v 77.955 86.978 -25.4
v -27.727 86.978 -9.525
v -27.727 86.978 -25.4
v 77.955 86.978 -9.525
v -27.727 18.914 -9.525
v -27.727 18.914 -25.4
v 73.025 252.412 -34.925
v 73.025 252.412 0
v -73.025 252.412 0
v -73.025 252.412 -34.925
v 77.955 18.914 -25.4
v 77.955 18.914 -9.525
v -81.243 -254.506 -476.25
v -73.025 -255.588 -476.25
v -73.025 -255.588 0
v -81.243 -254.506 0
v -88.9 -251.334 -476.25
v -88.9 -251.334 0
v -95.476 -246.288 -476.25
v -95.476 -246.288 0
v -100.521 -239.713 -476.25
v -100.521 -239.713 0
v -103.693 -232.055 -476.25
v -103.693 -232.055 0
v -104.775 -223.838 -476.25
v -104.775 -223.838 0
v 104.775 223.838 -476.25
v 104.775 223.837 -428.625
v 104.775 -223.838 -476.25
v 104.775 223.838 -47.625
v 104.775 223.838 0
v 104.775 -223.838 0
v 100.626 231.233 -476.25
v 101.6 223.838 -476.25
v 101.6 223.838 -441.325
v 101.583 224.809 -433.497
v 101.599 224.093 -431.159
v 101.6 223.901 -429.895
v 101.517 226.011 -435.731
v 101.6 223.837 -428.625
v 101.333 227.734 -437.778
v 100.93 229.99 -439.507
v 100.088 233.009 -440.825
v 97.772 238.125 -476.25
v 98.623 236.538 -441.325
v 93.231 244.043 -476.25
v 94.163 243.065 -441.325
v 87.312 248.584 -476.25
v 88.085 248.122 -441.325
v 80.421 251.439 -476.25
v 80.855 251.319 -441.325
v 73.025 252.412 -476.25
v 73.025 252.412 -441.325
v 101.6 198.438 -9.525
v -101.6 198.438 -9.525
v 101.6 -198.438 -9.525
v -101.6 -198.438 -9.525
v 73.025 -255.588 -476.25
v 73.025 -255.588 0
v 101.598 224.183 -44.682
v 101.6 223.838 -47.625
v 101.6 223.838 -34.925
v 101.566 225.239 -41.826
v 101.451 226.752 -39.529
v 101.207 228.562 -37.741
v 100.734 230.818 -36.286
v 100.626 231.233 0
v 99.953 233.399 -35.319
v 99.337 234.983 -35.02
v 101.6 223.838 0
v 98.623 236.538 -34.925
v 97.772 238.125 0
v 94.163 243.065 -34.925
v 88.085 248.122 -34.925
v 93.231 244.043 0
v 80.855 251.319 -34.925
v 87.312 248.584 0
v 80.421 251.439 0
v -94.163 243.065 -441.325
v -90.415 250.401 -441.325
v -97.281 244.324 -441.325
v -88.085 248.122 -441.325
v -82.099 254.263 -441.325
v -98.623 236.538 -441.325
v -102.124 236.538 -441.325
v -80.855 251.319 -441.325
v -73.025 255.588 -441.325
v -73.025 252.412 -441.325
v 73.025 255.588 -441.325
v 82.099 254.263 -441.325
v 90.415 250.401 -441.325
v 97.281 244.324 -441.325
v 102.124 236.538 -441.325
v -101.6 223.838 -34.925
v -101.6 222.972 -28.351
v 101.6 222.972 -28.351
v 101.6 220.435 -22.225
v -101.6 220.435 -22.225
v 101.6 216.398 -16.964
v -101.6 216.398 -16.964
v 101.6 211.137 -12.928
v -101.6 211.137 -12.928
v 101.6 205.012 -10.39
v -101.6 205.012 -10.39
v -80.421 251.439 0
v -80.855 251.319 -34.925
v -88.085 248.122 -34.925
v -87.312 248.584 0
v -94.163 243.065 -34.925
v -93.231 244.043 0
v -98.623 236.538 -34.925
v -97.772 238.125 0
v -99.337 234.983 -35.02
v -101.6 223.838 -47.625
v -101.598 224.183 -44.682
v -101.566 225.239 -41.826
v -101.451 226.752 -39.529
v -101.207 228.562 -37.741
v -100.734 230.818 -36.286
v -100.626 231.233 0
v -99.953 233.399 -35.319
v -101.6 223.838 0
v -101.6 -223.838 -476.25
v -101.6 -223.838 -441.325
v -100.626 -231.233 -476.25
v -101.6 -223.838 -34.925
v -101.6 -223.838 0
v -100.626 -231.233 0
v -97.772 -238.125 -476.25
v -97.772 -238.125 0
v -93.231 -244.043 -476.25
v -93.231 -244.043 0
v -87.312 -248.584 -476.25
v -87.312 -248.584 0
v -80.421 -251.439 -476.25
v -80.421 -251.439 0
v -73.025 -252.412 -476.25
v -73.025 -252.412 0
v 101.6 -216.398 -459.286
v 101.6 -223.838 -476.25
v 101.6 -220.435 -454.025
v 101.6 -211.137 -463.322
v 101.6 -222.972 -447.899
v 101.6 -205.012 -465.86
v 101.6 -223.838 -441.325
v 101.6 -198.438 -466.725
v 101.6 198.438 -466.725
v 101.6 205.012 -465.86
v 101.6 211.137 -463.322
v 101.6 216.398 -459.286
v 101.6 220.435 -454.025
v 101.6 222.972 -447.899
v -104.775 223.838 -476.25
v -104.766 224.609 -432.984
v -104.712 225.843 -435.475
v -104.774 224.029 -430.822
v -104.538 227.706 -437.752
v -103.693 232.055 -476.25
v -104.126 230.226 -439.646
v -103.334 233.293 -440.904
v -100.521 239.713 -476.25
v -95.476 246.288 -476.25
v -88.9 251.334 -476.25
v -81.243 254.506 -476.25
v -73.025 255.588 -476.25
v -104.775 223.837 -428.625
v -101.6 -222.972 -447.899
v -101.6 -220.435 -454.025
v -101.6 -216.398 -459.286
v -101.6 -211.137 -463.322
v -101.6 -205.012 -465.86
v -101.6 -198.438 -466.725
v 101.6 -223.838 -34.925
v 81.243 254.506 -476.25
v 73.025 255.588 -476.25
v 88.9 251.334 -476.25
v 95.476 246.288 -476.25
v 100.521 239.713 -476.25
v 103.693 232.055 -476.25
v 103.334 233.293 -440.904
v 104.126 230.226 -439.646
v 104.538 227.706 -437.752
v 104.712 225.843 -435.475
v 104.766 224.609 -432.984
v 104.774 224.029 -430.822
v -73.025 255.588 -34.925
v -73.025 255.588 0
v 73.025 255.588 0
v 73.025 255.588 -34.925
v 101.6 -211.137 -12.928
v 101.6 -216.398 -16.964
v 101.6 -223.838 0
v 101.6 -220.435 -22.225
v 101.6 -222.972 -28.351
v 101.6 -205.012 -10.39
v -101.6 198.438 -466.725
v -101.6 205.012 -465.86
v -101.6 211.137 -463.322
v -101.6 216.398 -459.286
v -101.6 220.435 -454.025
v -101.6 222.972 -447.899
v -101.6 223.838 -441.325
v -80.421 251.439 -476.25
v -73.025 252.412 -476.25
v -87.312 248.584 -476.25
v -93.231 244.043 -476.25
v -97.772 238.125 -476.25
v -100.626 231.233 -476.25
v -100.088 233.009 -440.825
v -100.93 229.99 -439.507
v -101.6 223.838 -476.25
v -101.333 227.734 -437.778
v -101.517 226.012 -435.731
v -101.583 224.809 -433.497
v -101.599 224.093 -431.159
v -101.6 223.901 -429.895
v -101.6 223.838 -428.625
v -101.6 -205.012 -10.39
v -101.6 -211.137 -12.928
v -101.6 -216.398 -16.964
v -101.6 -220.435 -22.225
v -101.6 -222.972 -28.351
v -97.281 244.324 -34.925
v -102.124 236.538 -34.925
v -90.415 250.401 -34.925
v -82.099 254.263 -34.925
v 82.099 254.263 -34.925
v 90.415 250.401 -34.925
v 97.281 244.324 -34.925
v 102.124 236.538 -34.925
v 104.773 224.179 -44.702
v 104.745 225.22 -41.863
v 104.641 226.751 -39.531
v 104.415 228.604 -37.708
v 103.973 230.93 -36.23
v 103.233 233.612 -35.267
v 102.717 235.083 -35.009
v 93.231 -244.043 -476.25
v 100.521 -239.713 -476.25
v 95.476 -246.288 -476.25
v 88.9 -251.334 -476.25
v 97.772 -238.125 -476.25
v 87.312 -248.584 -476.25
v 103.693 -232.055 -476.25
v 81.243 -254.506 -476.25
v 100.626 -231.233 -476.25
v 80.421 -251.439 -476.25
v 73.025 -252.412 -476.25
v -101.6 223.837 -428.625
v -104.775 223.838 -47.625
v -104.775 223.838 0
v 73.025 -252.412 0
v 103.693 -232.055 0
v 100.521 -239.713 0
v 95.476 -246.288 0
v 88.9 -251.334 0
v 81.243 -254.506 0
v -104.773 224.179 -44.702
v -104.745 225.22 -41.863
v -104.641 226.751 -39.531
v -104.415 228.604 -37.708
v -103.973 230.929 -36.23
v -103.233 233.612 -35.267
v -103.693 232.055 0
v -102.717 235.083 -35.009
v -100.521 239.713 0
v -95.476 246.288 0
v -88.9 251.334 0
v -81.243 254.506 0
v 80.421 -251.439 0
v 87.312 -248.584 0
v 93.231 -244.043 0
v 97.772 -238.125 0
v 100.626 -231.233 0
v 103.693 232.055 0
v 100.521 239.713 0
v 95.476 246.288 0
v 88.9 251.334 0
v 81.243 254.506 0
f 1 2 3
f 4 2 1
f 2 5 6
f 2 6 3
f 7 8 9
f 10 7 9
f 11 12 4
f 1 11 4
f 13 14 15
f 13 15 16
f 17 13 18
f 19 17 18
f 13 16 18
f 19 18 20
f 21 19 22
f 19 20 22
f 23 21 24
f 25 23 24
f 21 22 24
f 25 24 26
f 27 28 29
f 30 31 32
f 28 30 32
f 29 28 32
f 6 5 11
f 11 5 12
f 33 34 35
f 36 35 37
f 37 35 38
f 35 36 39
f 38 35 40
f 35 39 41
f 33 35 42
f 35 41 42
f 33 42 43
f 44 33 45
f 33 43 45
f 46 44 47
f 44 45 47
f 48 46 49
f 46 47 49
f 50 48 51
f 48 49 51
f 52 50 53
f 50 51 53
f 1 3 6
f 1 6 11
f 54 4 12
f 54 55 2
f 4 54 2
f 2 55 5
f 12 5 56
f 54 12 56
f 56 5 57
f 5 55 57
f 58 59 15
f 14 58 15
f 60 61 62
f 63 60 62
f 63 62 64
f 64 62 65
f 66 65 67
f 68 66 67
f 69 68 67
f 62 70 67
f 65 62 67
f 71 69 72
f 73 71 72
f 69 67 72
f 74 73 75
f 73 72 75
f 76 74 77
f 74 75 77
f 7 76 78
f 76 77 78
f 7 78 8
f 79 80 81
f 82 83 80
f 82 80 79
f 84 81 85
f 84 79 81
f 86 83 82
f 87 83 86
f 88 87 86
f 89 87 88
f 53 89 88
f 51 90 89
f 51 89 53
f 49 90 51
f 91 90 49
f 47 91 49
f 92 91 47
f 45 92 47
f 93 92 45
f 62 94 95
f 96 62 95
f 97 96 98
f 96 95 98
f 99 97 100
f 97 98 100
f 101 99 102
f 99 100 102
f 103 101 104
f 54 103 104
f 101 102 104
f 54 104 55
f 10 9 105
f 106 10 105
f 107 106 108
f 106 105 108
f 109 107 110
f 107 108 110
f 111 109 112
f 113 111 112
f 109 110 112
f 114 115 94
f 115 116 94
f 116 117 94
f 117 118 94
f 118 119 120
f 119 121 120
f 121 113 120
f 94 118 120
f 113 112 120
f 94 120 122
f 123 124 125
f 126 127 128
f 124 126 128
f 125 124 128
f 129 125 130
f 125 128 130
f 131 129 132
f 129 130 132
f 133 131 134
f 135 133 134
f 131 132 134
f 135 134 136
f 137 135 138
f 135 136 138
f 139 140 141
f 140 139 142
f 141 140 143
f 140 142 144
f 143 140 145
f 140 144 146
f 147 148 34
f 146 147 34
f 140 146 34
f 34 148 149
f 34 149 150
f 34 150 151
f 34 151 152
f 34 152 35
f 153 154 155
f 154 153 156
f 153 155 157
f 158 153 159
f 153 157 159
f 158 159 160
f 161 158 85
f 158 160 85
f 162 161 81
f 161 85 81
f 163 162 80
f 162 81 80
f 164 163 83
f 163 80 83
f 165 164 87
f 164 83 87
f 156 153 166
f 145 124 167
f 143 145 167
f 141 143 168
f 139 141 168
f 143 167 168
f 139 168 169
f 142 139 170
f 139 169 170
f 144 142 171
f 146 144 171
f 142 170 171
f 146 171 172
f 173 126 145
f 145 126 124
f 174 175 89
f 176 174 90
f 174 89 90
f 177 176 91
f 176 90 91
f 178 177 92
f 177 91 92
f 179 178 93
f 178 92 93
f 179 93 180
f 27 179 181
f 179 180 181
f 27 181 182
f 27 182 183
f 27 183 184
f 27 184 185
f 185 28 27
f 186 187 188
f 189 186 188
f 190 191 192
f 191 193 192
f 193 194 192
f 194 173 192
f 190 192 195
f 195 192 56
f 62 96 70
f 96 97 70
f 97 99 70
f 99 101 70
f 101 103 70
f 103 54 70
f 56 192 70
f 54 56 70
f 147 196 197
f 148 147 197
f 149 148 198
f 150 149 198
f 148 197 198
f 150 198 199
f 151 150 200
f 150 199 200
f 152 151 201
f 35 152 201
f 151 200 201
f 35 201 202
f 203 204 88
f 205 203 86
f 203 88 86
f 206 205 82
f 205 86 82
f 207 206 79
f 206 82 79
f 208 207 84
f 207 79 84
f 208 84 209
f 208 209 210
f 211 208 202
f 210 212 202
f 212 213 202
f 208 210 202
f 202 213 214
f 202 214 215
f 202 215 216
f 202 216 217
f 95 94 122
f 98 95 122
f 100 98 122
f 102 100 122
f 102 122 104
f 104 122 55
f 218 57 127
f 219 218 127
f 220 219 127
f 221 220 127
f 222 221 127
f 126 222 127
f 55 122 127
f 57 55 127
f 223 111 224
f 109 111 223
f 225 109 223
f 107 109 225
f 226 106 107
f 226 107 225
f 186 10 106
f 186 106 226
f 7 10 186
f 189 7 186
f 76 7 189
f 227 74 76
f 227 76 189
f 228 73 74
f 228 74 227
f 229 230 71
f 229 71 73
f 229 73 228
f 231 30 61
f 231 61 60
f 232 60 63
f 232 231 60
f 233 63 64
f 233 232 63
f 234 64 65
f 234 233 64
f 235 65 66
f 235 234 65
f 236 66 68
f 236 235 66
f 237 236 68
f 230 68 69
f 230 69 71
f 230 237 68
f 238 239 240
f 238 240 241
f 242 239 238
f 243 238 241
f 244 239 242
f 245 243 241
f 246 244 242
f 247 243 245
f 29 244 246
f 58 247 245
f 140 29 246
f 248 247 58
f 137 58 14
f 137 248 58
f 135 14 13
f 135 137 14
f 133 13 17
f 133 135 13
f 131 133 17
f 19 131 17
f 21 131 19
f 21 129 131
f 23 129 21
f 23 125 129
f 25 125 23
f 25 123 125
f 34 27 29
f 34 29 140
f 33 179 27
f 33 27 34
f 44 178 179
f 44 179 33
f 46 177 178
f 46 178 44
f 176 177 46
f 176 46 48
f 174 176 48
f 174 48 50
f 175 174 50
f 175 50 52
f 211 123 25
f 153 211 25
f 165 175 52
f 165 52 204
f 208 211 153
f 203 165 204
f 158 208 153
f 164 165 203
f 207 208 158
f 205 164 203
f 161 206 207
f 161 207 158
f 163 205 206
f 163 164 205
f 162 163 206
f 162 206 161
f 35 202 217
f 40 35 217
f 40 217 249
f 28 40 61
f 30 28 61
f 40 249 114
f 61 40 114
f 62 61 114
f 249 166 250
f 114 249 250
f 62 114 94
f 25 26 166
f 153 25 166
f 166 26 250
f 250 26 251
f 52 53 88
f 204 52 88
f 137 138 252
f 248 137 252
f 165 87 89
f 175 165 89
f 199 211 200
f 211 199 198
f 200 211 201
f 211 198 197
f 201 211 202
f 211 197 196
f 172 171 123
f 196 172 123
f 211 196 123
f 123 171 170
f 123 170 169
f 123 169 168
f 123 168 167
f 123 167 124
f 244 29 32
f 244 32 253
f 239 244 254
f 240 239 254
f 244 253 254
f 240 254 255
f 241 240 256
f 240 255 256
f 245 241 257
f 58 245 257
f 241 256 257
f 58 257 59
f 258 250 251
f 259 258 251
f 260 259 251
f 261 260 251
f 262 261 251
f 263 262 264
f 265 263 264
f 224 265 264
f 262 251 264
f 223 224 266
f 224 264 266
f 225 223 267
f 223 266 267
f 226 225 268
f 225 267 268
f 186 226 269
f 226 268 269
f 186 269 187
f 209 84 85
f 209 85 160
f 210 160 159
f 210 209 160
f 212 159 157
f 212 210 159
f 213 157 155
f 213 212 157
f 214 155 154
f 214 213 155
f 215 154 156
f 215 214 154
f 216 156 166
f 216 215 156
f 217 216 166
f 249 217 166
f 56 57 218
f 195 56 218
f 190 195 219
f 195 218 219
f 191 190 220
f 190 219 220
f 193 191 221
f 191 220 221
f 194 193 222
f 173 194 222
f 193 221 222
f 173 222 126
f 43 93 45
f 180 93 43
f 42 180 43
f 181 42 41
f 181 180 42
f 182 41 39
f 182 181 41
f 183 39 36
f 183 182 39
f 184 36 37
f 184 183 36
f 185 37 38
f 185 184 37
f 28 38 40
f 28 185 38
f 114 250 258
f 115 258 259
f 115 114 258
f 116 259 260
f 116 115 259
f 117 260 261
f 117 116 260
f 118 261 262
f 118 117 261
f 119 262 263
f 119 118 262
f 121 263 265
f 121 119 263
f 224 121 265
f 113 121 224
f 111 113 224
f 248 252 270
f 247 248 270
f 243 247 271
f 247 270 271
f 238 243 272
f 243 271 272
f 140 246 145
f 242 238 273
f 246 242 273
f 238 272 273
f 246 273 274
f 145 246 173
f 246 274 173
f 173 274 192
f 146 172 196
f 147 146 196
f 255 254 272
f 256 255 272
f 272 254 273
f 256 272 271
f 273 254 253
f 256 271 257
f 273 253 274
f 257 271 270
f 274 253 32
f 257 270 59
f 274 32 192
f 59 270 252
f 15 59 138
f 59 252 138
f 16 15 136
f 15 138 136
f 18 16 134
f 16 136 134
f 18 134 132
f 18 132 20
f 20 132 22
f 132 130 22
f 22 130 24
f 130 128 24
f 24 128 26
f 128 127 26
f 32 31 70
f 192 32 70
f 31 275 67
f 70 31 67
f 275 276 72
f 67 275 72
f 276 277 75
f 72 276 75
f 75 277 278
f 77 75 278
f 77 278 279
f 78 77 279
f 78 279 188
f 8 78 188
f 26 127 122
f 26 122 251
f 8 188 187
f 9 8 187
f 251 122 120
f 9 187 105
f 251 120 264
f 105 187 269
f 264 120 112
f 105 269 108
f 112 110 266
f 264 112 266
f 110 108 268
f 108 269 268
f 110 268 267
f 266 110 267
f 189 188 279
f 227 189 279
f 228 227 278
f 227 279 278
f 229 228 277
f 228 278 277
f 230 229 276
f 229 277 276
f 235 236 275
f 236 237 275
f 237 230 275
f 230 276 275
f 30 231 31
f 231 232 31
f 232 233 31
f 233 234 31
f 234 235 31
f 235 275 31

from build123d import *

# Parameters (mm, degrees)
EXTRUDE1_DEPTH     = 476.25
CUT_EXTRUDE1_DEPTH = 210.55
EXTRUDE2_DEPTH     = 203.2
SKETCH5_W          = 105.681165702
SKETCH5_H          = 68.064456382
CUT_EXTRUDE2_DEPTH = 15.875


with BuildPart() as part:
    # Sketch1 → Extrude1 (new body)
    with BuildSketch(Plane.XY):
        with BuildLine():
            Line((-73.025, 255.5875), (73.025, 255.5875))
            ThreePointArc((73.025, 255.5875), (95.475640303, 246.288140303), (104.775, 223.8375))
            Line((104.775, 223.8375), (104.775, -223.8375))
            ThreePointArc((104.775, -223.8375), (95.475640303, -246.288140303), (73.025, -255.5875))
            Line((73.025, -255.5875), (-73.025, -255.5875))
            ThreePointArc((-73.025, -255.5875), (-95.475640303, -246.288140303), (-104.775, -223.8375))
            Line((-104.775, -223.8375), (-104.775, 223.8375))
            ThreePointArc((-104.775, 223.8375), (-95.475640303, 246.288140303), (-73.025, 255.5875))
        make_face()
        with BuildLine():
            Line((-101.6, 223.8375), (-101.6, -223.8375))
            ThreePointArc((-101.6, -223.8375), (-93.230576272, -244.043076272), (-73.025, -252.4125))
            Line((-73.025, -252.4125), (73.025, -252.4125))
            ThreePointArc((73.025, -252.4125), (93.230576272, -244.043076272), (101.6, -223.8375))
            Line((101.6, -223.8375), (101.6, 223.8375))
            ThreePointArc((101.6, 223.8375), (93.230576272, 244.043076272), (73.025, 252.4125))
            Line((73.025, 252.4125), (-73.025, 252.4125))
            ThreePointArc((-73.025, 252.4125), (-93.230576272, 244.043076272), (-101.6, 223.8375))
        make_face(mode=Mode.SUBTRACT)
    extrude(amount=-EXTRUDE1_DEPTH)

    # Sketch2 → Cut-Extrude1 (cut, through all)
    with BuildSketch(Plane(origin=(104.775, 0, 0), x_dir=(0, 0, -1), z_dir=(1, 0, 0))):
        with BuildLine():
            Line((34.925, 236.5375), (34.925, 258.595805141))
            Line((34.925, 258.595805141), (441.325, 258.595805141))
            Line((441.325, 258.595805141), (441.325, 236.5375))
            ThreePointArc((441.325, 236.5375), (437.605256121, 227.557243879), (428.625, 223.8375))
            Line((428.625, 223.8375), (47.625, 223.8375))
            ThreePointArc((47.625, 223.8375), (38.644743879, 227.557243879), (34.925, 236.5375))
        make_face()
    extrude(amount=-CUT_EXTRUDE1_DEPTH, mode=Mode.SUBTRACT)

    # Sketch4 → Extrude2 (add)
    with BuildSketch(Plane(origin=(-101.6, 0, 0), x_dir=(0, 0, -1), z_dir=(1, 0, 0))):
        with BuildLine():
            Line((9.525, 198.4375), (9.525, -198.4375))
            ThreePointArc((9.525, -198.4375), (16.964487758, -216.398012242), (34.925, -223.8375))
            Line((34.925, -223.8375), (441.325, -223.8375))
            ThreePointArc((441.325, -223.8375), (459.285512242, -216.398012242), (466.725, -198.4375))
            Line((466.725, -198.4375), (466.725, 198.4375))
            ThreePointArc((466.725, 198.4375), (459.285512242, 216.398012242), (441.325, 223.8375))
            Line((441.325, 223.8375), (34.925, 223.8375))
            ThreePointArc((34.925, 223.8375), (16.964487758, 216.398012242), (9.525, 198.4375))
        make_face()
    extrude(amount=EXTRUDE2_DEPTH)

    # Sketch5 → Cut-Extrude2 (cut)
    with BuildSketch(Plane.XY.offset(-9.525)):
        with Locations((25.113927792, 52.946208207)):
            Rectangle(SKETCH5_W, SKETCH5_H)
    extrude(amount=-CUT_EXTRUDE2_DEPTH, mode=Mode.SUBTRACT)


solid = part.part
